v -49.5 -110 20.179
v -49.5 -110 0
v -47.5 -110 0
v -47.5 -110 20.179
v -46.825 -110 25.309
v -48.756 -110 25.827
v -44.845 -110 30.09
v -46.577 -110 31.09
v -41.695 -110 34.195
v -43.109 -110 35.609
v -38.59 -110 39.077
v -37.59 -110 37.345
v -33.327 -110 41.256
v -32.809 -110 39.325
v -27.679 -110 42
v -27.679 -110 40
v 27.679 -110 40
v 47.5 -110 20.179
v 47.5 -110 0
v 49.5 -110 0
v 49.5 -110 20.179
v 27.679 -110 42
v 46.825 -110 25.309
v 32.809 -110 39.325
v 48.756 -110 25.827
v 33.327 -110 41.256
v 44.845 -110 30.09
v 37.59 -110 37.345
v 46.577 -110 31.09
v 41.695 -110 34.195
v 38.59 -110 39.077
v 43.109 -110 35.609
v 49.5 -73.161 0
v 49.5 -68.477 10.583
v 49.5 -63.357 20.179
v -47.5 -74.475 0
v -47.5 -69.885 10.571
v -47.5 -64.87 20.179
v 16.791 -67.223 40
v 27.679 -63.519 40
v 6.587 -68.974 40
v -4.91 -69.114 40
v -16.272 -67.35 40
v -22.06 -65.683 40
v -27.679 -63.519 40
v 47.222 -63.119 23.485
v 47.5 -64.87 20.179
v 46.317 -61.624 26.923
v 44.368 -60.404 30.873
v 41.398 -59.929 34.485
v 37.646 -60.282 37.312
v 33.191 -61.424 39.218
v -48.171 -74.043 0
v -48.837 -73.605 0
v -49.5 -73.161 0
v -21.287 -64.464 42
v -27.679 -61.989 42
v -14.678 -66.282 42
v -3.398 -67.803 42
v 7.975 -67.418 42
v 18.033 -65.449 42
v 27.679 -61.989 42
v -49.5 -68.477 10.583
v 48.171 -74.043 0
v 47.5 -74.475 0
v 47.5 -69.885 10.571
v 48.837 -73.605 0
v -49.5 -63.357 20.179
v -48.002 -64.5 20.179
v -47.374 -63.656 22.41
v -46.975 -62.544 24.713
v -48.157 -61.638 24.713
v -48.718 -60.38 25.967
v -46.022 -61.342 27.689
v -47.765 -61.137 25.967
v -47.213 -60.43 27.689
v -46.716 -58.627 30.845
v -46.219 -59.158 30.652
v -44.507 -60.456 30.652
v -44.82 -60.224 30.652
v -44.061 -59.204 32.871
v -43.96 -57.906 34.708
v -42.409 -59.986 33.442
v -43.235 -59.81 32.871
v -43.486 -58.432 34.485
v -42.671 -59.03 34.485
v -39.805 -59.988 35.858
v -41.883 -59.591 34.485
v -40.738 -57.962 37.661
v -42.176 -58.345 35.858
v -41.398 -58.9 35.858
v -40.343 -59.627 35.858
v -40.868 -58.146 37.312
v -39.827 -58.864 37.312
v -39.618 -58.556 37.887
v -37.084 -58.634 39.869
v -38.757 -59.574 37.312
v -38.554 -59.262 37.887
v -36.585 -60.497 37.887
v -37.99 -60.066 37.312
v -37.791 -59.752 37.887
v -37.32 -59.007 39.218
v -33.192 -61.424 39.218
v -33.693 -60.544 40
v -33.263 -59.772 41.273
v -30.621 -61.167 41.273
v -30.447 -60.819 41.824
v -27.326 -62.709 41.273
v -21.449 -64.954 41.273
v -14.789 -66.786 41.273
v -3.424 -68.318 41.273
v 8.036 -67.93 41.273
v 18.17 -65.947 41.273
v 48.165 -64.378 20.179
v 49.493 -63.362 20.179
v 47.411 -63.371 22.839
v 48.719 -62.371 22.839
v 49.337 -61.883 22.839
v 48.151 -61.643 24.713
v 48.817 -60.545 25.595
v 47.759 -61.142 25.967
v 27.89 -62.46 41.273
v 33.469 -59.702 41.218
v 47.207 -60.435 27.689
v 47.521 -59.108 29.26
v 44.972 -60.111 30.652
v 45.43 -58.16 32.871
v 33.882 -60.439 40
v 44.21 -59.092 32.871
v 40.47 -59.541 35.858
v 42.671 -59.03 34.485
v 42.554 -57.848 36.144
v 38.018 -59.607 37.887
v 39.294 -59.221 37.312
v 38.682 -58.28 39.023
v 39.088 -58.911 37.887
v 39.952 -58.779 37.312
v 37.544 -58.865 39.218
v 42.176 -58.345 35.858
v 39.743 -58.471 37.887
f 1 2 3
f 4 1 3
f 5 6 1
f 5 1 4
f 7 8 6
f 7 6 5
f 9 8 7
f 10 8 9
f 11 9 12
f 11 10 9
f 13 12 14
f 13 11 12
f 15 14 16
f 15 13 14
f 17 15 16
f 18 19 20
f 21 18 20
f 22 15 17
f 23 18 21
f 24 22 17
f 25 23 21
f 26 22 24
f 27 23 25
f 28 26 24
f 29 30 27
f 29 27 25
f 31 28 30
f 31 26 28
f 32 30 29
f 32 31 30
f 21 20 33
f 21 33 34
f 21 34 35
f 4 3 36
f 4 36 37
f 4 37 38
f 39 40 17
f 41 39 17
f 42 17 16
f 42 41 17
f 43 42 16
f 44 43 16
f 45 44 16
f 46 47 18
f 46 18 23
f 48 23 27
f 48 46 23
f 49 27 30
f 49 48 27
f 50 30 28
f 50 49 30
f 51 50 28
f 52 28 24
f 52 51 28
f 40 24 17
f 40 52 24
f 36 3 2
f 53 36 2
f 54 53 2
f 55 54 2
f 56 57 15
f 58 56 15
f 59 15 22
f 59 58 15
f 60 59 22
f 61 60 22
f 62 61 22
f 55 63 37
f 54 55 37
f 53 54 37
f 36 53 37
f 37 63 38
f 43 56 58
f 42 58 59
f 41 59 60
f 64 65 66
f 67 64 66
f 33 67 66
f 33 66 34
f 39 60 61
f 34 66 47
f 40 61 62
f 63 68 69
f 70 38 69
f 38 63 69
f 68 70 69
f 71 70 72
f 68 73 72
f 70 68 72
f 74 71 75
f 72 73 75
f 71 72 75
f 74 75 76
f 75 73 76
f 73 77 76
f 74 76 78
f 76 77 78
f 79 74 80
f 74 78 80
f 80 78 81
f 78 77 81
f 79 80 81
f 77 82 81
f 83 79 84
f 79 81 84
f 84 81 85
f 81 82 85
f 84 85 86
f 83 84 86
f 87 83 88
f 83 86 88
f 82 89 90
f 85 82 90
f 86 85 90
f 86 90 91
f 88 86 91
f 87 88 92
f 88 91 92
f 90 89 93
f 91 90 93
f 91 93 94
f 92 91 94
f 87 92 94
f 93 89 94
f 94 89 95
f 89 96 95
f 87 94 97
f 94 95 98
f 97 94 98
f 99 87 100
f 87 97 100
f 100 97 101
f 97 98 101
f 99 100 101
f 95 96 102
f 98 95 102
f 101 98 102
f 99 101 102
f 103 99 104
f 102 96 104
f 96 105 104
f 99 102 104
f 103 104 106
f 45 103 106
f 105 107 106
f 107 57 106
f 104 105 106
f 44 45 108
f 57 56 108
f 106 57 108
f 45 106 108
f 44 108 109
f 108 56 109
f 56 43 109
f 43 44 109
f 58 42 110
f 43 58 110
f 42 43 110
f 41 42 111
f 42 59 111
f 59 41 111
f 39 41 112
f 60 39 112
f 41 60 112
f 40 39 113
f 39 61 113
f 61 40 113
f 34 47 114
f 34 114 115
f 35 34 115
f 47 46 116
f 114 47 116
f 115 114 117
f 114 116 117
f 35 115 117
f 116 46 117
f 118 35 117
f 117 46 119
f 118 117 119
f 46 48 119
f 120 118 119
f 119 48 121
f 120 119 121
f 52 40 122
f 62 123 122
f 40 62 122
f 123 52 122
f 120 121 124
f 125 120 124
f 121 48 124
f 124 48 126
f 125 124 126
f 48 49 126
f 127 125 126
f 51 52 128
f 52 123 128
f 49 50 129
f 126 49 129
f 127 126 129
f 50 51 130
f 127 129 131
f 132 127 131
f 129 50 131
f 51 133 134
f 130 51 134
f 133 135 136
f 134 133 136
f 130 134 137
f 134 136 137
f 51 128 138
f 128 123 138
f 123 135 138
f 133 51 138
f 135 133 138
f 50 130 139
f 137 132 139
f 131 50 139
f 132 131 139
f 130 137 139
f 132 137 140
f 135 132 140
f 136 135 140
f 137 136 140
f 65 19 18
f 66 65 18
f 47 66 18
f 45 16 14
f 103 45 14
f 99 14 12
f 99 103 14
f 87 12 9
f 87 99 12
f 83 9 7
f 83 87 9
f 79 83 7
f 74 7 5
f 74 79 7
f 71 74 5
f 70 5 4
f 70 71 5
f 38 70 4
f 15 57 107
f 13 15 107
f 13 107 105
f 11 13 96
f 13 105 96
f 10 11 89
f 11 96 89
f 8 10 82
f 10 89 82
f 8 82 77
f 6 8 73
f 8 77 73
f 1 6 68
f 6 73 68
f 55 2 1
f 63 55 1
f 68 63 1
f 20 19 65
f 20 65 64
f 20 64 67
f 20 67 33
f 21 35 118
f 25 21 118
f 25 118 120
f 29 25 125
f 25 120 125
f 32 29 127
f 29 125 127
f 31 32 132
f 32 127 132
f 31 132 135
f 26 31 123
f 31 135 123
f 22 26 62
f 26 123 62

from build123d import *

# Parameters (mm, degrees)
EXTRUDE003_DEPTH = 110


with BuildPart() as neg_dome:
    # Sketch006 → Revolve002 (revolve)
    with BuildSketch(Plane.XZ):
        with BuildLine():
            add(Edge.make_bspline(
                [(-88.333, 0), (-61.873, 79.23), (0, 75)],
                knots=[0, 0, 0, 1, 1, 1], degree=2))
            Line((0, 75), (0, 0))
            Line((0, 0), (-88.333, 0))
        make_face()
    revolve(axis=Axis((0, 0, 0), (0, 0, 1)))


with BuildPart() as pos_cap:
    # Sketch003 → Extrude003 (new body)
    with BuildSketch(Plane.XZ):
        with BuildLine():
            Line((-47.5, 0), (-47.5, 20.17919))
            ThreePointArc((-27.67919, 40), (-41.694619, 34.194619), (-47.5, 20.17919))
            Line((27.67919, 40), (-27.67919, 40))
            ThreePointArc((47.5, 20.17919), (41.694619, 34.194619), (27.67919, 40))
            Line((47.5, 0), (47.5, 20.17919))
            Line((47.5, 0), (49.5, 0))
            Line((49.5, 0), (49.5, 20.17919))
            ThreePointArc((49.5, 20.17919), (43.108833, 35.608833), (27.67919, 42))
            Line((-27.67919, 42), (27.67919, 42))
            ThreePointArc((-27.67919, 42), (-43.108833, 35.608833), (-49.5, 20.17919))
            Line((-49.5, 0), (-49.5, 20.17919))
            Line((-47.5, 0), (-49.5, 0))
        make_face()
    extrude(amount=EXTRUDE003_DEPTH)

    # Cut002: cut neg_dome
    add(neg_dome.part, mode=Mode.SUBTRACT)


solid = pos_cap.part
